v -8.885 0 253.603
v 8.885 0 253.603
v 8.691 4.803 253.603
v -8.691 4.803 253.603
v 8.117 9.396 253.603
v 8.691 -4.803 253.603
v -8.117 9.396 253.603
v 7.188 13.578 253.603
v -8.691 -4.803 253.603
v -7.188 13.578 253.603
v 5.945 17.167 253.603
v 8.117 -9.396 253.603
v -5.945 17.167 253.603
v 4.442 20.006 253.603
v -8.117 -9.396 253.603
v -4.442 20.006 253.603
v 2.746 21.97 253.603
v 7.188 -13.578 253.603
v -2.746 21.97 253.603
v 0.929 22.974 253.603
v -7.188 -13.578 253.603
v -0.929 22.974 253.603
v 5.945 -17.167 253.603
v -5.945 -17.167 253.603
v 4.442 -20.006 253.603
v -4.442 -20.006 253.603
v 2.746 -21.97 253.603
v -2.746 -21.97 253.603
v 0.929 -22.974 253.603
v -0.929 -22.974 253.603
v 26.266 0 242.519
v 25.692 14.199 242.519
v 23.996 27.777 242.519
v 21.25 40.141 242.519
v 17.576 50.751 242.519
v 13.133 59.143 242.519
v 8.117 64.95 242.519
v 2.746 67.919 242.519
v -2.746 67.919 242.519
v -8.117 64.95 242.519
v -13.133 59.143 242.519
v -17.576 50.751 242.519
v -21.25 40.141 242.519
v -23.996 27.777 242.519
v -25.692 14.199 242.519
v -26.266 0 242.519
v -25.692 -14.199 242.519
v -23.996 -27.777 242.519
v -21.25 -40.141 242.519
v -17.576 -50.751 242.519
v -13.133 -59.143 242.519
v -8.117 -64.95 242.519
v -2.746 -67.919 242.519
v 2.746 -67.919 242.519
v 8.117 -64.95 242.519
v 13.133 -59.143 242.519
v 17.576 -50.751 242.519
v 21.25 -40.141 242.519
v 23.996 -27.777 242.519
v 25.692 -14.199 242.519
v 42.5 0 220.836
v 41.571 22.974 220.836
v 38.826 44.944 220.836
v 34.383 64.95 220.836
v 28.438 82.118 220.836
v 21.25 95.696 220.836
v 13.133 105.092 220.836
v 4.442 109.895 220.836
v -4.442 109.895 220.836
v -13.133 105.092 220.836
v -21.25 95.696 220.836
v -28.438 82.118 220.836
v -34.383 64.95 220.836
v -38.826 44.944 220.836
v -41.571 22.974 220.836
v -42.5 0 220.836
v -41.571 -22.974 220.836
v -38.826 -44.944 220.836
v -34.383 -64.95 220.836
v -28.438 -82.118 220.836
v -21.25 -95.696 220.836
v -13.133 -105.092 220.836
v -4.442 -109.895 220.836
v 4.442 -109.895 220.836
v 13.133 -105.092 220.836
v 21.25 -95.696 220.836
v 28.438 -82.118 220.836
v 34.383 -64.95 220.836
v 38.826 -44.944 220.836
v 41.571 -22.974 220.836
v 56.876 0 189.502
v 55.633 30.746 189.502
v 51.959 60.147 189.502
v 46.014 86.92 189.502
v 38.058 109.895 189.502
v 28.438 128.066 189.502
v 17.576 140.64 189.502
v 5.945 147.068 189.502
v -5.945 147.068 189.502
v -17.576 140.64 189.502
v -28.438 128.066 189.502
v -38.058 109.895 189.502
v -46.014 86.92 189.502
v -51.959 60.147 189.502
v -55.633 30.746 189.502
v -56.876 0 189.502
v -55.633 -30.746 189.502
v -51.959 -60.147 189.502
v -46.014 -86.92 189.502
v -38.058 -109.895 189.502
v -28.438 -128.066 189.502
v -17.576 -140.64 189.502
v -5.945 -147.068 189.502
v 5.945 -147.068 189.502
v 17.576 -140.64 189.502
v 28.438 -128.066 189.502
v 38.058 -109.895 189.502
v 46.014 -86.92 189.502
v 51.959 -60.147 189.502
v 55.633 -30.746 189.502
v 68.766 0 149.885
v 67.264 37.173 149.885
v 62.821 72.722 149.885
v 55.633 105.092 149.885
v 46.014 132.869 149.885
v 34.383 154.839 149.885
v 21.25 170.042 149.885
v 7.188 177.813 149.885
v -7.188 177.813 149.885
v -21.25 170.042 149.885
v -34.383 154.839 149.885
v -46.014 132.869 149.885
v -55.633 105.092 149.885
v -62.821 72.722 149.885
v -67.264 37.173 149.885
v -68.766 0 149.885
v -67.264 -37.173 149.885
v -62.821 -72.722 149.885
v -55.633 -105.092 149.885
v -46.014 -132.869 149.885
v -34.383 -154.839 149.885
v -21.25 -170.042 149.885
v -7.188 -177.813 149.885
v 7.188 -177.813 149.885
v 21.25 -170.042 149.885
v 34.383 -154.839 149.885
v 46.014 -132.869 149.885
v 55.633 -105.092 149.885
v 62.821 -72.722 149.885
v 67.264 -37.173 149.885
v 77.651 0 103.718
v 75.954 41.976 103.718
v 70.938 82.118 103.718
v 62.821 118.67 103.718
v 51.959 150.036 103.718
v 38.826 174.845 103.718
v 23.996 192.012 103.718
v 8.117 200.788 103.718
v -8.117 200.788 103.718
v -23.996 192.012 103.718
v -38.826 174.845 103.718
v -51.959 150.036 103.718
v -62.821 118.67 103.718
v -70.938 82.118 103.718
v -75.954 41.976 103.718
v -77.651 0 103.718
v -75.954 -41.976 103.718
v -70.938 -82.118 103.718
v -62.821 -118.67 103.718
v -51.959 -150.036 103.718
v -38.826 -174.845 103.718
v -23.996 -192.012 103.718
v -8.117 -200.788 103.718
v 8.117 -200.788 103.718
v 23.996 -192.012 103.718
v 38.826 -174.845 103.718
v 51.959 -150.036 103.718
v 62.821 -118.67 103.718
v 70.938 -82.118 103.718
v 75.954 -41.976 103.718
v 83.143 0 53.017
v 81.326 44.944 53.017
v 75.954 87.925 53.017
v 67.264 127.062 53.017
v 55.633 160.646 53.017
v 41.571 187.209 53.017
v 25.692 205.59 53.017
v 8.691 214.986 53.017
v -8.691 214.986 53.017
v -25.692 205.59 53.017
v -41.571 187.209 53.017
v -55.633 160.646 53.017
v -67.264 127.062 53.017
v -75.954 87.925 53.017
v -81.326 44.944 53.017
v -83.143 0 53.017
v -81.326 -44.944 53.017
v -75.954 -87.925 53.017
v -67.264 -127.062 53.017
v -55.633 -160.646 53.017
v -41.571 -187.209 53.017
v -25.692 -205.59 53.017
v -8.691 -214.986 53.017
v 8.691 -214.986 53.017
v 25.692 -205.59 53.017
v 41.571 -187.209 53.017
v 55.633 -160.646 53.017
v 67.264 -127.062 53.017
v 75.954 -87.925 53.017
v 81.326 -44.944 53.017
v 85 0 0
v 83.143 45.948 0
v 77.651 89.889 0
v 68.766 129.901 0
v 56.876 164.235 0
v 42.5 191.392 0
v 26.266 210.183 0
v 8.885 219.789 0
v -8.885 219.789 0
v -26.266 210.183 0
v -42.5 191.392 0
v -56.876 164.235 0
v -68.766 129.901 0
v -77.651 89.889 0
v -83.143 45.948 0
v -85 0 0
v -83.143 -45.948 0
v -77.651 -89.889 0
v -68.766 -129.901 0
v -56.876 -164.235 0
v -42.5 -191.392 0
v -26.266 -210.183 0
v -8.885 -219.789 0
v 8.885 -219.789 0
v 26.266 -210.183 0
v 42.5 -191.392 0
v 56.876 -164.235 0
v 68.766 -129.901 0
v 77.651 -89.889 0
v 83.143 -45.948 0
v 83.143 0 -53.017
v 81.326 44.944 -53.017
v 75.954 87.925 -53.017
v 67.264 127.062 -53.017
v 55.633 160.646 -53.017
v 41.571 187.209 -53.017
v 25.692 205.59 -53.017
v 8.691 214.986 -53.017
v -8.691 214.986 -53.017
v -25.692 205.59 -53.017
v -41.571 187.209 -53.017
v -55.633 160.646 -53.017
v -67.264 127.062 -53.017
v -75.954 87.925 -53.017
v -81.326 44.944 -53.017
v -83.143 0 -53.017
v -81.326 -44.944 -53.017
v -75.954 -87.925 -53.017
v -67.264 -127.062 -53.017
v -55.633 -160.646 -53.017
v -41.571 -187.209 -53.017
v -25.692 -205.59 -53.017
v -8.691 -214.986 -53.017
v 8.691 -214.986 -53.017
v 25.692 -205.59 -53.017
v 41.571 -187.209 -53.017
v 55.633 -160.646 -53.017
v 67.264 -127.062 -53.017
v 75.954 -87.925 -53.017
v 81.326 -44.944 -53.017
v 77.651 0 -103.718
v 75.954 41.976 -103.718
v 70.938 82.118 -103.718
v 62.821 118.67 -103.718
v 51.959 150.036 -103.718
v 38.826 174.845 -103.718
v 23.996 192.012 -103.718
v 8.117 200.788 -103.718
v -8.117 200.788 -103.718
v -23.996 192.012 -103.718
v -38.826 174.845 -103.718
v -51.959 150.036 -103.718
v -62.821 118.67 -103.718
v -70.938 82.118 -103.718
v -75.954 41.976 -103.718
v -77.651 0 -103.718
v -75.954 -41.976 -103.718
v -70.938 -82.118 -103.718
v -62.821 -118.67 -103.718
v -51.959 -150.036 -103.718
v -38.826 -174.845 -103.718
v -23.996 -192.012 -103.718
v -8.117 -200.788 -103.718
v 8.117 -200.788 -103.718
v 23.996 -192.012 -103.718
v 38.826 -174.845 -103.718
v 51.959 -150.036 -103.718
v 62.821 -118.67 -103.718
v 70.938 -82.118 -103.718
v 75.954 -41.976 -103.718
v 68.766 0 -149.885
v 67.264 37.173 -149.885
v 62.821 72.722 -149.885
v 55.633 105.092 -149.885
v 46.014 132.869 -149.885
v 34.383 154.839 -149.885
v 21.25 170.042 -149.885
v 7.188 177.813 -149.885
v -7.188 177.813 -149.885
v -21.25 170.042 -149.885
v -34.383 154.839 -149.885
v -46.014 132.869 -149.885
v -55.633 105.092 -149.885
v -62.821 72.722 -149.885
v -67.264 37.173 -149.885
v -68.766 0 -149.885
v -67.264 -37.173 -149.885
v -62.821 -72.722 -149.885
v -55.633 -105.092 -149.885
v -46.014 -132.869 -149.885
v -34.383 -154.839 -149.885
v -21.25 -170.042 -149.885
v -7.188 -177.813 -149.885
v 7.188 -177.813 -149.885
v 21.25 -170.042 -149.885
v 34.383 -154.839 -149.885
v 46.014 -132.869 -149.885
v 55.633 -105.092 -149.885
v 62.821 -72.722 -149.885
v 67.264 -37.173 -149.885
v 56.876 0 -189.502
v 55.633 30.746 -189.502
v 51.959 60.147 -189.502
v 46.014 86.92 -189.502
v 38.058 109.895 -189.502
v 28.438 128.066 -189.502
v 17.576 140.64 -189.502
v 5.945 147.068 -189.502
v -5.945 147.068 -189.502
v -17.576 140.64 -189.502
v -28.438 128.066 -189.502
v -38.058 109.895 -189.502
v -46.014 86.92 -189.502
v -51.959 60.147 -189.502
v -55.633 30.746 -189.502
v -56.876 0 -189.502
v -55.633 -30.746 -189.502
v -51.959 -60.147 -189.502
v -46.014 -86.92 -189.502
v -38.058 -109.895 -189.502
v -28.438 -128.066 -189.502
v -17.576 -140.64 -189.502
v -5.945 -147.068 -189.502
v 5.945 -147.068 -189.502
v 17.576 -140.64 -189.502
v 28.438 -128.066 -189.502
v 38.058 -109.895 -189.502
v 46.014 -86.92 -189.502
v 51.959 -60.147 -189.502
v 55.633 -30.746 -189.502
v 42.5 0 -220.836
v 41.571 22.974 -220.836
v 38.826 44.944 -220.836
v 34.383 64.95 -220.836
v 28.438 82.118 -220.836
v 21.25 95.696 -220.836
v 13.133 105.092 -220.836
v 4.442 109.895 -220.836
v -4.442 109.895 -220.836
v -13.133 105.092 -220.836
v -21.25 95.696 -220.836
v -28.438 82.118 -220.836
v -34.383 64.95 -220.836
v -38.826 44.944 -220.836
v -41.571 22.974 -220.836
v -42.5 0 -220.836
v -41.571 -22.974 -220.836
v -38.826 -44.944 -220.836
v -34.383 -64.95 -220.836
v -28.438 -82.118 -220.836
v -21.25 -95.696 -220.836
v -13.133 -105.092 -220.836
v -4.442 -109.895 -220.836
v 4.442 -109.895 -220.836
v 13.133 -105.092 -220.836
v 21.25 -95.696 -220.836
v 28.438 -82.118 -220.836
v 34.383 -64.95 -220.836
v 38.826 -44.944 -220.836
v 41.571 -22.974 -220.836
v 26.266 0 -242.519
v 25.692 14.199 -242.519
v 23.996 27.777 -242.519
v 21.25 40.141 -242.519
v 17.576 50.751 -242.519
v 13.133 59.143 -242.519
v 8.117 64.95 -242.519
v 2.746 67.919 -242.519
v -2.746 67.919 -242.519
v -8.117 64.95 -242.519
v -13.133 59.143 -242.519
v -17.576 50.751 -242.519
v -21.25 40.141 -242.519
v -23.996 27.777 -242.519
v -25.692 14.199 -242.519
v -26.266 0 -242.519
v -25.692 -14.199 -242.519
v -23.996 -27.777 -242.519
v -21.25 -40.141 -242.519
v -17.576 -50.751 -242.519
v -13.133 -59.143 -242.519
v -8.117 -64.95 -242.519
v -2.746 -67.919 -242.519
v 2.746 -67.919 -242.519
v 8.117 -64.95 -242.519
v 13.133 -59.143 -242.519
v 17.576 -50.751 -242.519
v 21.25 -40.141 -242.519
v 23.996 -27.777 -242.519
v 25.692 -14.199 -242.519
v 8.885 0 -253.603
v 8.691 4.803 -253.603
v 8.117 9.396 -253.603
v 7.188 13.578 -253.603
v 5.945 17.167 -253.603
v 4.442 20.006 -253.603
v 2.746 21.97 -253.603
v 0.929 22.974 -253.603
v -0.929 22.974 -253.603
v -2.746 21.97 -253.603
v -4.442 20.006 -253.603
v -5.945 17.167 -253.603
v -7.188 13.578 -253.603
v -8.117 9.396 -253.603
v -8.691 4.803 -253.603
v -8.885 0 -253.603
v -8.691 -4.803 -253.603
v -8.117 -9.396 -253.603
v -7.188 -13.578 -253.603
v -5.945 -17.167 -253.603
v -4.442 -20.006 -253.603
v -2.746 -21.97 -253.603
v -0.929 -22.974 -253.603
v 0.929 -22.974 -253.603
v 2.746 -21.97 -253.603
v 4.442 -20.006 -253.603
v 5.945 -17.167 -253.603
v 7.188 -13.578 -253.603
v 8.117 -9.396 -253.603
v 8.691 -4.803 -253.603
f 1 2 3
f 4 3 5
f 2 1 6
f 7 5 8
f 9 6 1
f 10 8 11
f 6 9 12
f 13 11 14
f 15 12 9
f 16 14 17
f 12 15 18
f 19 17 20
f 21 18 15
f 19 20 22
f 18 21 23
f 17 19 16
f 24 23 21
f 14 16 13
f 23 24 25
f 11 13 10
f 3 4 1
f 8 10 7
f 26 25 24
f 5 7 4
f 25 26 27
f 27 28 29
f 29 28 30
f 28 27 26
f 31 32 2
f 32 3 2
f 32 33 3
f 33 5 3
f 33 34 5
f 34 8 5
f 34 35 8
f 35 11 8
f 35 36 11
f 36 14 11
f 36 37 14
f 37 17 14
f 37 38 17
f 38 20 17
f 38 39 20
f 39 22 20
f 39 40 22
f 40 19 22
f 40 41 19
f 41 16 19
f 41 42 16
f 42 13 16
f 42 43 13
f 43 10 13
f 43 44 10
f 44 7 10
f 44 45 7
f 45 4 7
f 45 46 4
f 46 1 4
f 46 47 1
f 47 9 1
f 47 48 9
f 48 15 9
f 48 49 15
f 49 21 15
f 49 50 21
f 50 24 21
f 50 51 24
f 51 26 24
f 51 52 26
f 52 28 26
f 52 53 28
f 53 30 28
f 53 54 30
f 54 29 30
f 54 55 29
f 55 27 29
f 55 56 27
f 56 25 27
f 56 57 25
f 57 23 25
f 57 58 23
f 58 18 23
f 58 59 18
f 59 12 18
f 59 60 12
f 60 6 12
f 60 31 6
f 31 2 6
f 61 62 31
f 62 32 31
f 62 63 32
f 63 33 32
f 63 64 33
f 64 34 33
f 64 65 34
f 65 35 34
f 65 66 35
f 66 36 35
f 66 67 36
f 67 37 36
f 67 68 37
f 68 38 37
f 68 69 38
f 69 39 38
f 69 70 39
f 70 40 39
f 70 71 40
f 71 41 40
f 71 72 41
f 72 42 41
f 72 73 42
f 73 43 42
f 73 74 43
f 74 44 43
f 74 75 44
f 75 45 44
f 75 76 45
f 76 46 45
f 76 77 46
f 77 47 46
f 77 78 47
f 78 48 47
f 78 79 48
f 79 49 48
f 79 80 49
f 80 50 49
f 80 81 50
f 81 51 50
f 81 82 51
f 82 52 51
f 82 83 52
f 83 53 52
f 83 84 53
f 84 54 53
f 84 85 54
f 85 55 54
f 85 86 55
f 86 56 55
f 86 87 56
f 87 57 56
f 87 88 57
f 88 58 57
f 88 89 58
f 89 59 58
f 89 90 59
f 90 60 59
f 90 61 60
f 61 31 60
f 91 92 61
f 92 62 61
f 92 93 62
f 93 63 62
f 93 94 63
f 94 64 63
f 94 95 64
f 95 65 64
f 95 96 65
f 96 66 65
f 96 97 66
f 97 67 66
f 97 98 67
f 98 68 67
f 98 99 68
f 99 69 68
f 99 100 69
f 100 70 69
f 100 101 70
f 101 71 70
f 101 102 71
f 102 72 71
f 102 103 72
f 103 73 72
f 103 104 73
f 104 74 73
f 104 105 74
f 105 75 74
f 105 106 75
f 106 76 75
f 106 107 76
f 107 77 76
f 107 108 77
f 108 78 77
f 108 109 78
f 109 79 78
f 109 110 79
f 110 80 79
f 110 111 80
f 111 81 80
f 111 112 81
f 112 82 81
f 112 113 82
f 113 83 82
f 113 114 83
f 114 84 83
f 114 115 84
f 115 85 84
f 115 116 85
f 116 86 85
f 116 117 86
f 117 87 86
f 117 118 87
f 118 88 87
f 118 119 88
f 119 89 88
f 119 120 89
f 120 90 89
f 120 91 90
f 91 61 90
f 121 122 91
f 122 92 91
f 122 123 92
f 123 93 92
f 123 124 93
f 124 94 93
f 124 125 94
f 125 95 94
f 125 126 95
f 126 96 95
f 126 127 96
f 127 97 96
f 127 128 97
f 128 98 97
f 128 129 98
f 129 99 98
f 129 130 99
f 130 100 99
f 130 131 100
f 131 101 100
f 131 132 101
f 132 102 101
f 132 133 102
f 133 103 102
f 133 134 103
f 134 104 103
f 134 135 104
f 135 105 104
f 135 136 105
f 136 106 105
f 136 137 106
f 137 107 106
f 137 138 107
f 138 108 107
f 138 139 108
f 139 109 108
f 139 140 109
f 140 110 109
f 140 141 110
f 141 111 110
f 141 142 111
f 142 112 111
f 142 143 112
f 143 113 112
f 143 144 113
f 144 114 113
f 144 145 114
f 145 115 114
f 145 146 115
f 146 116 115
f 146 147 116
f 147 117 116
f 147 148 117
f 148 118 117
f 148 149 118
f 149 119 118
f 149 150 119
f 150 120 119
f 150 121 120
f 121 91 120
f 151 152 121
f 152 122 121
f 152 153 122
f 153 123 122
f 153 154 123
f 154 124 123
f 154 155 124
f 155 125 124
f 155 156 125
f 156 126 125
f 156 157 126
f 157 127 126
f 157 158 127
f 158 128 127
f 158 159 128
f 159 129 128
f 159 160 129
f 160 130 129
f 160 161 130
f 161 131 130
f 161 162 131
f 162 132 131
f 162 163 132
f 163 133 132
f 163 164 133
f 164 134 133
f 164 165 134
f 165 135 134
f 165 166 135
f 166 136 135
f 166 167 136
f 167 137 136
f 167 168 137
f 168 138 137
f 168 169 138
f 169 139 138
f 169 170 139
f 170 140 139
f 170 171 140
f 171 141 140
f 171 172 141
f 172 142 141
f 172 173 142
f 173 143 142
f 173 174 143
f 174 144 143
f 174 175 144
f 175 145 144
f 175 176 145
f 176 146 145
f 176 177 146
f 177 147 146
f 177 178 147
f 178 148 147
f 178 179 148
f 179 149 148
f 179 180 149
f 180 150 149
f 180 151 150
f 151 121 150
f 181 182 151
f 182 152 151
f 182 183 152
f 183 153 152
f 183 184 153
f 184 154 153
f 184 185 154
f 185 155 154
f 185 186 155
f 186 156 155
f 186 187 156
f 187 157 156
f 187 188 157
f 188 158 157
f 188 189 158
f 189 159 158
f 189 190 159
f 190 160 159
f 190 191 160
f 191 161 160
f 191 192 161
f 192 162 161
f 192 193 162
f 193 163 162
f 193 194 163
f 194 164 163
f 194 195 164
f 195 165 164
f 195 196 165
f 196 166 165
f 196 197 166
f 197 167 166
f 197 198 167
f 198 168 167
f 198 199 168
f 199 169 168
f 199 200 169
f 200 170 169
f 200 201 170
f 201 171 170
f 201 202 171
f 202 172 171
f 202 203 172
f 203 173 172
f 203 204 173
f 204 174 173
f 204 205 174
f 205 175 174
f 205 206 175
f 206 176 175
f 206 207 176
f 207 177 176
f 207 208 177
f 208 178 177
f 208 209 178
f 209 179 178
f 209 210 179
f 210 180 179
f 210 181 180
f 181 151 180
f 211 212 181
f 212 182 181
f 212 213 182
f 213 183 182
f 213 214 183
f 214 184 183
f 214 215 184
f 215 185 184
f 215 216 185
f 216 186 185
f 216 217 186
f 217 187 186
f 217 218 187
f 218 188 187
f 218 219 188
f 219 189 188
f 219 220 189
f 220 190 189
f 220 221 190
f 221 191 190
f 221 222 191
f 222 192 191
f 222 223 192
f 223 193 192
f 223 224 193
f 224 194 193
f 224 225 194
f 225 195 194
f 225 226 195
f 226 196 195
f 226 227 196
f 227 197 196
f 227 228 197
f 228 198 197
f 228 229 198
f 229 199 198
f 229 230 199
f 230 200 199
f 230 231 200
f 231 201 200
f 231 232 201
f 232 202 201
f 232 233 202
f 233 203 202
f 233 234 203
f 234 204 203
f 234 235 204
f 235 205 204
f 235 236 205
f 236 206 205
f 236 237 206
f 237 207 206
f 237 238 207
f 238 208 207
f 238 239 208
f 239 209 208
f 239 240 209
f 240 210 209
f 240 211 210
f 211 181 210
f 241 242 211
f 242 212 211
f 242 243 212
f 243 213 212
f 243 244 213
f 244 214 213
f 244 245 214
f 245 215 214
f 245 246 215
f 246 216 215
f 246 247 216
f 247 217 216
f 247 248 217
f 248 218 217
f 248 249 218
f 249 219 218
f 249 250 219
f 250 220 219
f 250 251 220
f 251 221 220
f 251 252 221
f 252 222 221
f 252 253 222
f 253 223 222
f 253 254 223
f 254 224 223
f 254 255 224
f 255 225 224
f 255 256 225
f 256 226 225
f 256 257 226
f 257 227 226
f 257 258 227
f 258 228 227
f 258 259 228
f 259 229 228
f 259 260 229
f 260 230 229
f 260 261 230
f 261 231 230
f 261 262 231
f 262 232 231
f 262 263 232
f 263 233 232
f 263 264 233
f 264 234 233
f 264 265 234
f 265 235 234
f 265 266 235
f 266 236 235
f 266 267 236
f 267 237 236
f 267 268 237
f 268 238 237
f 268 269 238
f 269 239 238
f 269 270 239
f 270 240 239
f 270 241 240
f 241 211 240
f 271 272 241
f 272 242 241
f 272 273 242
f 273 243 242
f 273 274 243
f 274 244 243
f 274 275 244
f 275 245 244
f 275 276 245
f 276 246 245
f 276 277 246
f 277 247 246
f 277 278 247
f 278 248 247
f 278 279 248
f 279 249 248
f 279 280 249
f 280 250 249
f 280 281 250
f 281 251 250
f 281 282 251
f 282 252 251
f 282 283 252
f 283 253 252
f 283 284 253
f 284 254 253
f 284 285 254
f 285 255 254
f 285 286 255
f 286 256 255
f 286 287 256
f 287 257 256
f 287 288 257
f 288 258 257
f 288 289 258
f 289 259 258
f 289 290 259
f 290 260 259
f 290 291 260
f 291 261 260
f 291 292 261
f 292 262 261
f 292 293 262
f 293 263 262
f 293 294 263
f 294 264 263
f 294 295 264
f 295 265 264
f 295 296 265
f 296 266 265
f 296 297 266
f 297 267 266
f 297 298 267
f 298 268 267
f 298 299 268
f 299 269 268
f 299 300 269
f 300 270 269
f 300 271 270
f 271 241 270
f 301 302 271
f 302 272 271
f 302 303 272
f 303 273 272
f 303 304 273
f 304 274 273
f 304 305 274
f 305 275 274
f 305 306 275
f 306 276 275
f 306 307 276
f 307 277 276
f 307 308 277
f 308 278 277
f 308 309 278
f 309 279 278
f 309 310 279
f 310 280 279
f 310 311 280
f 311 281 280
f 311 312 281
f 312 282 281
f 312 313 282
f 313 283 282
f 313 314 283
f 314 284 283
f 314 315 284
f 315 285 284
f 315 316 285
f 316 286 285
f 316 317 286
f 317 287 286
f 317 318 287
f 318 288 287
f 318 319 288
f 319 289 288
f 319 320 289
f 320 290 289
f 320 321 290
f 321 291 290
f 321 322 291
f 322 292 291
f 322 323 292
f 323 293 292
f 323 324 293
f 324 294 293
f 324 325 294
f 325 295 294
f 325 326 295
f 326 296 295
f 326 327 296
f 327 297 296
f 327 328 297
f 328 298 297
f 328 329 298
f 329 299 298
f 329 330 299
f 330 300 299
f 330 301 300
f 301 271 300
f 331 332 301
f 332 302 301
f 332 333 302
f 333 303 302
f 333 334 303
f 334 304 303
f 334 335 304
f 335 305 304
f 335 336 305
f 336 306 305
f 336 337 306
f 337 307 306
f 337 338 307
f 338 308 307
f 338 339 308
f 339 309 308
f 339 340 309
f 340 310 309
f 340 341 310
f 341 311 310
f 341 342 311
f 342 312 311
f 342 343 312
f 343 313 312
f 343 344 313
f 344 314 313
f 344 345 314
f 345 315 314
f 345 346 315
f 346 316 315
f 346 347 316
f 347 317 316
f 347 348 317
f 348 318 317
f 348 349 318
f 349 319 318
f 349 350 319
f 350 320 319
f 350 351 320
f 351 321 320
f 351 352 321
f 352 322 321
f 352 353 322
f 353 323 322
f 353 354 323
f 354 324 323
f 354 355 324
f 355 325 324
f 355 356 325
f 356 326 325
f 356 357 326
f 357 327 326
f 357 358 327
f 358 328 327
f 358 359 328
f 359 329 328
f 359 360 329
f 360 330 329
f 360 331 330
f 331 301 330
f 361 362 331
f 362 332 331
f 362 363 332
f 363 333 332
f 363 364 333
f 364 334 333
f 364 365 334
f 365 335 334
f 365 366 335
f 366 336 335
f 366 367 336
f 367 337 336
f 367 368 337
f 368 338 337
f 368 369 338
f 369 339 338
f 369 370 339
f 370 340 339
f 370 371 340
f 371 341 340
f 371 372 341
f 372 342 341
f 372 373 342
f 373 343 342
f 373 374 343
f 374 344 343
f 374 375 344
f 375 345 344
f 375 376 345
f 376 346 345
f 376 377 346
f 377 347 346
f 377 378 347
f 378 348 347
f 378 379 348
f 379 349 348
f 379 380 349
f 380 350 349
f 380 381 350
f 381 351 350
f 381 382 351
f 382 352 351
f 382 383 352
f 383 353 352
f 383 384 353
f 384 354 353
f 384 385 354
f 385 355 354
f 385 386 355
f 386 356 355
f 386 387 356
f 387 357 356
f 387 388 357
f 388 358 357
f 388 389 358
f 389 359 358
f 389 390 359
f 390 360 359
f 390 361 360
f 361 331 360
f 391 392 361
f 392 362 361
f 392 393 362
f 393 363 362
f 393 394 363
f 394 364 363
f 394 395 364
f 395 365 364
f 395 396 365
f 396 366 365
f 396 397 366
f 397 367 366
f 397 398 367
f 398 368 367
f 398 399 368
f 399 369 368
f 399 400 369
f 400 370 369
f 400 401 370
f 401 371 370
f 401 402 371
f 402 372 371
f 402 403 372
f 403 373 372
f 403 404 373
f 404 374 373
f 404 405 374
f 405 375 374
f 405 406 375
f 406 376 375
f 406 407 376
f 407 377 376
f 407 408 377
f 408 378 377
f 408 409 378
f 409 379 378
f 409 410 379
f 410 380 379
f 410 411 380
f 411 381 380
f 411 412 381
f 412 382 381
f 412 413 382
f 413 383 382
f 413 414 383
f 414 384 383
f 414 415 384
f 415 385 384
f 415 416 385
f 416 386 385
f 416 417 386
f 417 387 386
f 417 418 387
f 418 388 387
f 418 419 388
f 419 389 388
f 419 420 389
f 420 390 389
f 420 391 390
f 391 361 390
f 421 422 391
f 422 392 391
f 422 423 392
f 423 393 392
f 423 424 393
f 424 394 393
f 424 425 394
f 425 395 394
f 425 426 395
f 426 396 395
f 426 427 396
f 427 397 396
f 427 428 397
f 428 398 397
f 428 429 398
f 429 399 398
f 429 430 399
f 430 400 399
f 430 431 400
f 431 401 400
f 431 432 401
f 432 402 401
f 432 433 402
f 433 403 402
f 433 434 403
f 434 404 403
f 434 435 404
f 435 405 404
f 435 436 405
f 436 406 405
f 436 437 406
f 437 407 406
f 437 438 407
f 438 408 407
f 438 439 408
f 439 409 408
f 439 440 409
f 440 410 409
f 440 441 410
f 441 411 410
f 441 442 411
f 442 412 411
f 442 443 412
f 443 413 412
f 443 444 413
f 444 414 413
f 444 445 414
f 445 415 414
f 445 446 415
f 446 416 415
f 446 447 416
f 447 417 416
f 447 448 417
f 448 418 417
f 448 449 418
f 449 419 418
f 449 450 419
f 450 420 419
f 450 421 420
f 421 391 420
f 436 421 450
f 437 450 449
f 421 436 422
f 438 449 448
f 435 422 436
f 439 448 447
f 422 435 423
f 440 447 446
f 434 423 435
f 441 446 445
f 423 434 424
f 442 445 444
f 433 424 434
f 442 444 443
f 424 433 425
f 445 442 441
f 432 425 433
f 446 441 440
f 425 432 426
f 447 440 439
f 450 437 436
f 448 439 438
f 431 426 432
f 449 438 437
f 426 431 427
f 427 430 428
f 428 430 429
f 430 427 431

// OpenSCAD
// Generated by SolidPython 1.0.1 on 2020-07-29 00:46:46


scale(v = [5, 13, 15]) {
	sphere(r = 17);
}
/***********************************************
*********      SolidPython code:      **********
************************************************
 
# import packages: SolidPython
from solid import *
from solid.utils import *
from itertools import chain, combinations, permutations


class Resize:

    def __init__(self, scad_file):
        self.scad_file = scad_file
        #self.scad_file = import_scad(scad_file)
        # cone/cylinder param:
        self.r1 = 0
        self.r2 = 0
        self.h = 0
        # rectangular prism param:
        self.w = 0
        self.l = 0
        # ellipse param:
        self.r = 0

    # import OpenScad code (file name corresponds to shape)


    # classify shape + parameters
    def assign(self, param1, param2, param3):
        if self.scad_file == 'cone.scad':
            self.r1 = param1
            self.r2 = param2
            self.h = param3
        elif self.scad_file == 'cylinder.scad':
            self.r1 = param1
            self.r2 = param2
            self.h = param3
        elif self.scad_file == 'rectangularPrism.scad':
            self.h = param1
            self.l = param2
            self.w = param3
        else:
            self.r = param1
            self.h = param2

    # resize parameters
    def iterate(self):
        x = range(3, 20, 2)
        i = 1
        if self.scad_file == 'cone.scad':
            tempList = list(permutations(x, 2))
            for temp in tempList:
                param1 = temp[0]
                param2 = temp[1]
                filepath = 'produced_scad_files/' + 'cone' + str(param1) + '_' + str(param2) + '_' + '.scad'
                scad_render_to_file(cylinder(h=param1, r1=param2, r2=0), filepath)

        elif self.scad_file == 'cylinder.scad':
            tempList = list(permutations(x, 3))
            for temp in tempList:
                param1 = temp[0]
                param2 = temp[1]
                filepath = 'produced_scad_files/' + 'cylinder' + str(param1) + '_' + str(param2) + '_' + '.scad'
                scad_render_to_file(cylinder(h=param1, r1=param2, r2=param2), filepath)

        elif self.scad_file == 'rectangularPrism.scad':
            tempList = list(permutations(x, 3))
            for temp in tempList:
                param1 = temp[0]
                param2 = temp[1]
                param3 = temp[2]
                filepath = 'produced_scad_files/' + 'rectangularPrism' + str(param1) + '_' + str(param2) + '_' + str(
                    param3) + '.scad'
                scad_render_to_file(cube(size=(param1, param2, param3)), filepath)

        elif self.scad_file == 'ellipse.scad':
            tempList = list(permutations(x, 4))
            for temp in tempList:
                param1 = temp[0]
                param2 = temp[1]
                param3 = temp[2]
                param4 = temp[3]
                filepath = 'produced_scad_files/' + 'ellipse' + str(param1) + '_' + str(param2) + '_' + str(param3) + '_' + str(param4) + '.scad'
                scad_render_to_file(scale([param1, param2, param3])(sphere(r=param4)), filepath)

    def render_to_scadfile(self):
        scad_render_to_file(scad, 'example.scad') 
 
************************************************/
